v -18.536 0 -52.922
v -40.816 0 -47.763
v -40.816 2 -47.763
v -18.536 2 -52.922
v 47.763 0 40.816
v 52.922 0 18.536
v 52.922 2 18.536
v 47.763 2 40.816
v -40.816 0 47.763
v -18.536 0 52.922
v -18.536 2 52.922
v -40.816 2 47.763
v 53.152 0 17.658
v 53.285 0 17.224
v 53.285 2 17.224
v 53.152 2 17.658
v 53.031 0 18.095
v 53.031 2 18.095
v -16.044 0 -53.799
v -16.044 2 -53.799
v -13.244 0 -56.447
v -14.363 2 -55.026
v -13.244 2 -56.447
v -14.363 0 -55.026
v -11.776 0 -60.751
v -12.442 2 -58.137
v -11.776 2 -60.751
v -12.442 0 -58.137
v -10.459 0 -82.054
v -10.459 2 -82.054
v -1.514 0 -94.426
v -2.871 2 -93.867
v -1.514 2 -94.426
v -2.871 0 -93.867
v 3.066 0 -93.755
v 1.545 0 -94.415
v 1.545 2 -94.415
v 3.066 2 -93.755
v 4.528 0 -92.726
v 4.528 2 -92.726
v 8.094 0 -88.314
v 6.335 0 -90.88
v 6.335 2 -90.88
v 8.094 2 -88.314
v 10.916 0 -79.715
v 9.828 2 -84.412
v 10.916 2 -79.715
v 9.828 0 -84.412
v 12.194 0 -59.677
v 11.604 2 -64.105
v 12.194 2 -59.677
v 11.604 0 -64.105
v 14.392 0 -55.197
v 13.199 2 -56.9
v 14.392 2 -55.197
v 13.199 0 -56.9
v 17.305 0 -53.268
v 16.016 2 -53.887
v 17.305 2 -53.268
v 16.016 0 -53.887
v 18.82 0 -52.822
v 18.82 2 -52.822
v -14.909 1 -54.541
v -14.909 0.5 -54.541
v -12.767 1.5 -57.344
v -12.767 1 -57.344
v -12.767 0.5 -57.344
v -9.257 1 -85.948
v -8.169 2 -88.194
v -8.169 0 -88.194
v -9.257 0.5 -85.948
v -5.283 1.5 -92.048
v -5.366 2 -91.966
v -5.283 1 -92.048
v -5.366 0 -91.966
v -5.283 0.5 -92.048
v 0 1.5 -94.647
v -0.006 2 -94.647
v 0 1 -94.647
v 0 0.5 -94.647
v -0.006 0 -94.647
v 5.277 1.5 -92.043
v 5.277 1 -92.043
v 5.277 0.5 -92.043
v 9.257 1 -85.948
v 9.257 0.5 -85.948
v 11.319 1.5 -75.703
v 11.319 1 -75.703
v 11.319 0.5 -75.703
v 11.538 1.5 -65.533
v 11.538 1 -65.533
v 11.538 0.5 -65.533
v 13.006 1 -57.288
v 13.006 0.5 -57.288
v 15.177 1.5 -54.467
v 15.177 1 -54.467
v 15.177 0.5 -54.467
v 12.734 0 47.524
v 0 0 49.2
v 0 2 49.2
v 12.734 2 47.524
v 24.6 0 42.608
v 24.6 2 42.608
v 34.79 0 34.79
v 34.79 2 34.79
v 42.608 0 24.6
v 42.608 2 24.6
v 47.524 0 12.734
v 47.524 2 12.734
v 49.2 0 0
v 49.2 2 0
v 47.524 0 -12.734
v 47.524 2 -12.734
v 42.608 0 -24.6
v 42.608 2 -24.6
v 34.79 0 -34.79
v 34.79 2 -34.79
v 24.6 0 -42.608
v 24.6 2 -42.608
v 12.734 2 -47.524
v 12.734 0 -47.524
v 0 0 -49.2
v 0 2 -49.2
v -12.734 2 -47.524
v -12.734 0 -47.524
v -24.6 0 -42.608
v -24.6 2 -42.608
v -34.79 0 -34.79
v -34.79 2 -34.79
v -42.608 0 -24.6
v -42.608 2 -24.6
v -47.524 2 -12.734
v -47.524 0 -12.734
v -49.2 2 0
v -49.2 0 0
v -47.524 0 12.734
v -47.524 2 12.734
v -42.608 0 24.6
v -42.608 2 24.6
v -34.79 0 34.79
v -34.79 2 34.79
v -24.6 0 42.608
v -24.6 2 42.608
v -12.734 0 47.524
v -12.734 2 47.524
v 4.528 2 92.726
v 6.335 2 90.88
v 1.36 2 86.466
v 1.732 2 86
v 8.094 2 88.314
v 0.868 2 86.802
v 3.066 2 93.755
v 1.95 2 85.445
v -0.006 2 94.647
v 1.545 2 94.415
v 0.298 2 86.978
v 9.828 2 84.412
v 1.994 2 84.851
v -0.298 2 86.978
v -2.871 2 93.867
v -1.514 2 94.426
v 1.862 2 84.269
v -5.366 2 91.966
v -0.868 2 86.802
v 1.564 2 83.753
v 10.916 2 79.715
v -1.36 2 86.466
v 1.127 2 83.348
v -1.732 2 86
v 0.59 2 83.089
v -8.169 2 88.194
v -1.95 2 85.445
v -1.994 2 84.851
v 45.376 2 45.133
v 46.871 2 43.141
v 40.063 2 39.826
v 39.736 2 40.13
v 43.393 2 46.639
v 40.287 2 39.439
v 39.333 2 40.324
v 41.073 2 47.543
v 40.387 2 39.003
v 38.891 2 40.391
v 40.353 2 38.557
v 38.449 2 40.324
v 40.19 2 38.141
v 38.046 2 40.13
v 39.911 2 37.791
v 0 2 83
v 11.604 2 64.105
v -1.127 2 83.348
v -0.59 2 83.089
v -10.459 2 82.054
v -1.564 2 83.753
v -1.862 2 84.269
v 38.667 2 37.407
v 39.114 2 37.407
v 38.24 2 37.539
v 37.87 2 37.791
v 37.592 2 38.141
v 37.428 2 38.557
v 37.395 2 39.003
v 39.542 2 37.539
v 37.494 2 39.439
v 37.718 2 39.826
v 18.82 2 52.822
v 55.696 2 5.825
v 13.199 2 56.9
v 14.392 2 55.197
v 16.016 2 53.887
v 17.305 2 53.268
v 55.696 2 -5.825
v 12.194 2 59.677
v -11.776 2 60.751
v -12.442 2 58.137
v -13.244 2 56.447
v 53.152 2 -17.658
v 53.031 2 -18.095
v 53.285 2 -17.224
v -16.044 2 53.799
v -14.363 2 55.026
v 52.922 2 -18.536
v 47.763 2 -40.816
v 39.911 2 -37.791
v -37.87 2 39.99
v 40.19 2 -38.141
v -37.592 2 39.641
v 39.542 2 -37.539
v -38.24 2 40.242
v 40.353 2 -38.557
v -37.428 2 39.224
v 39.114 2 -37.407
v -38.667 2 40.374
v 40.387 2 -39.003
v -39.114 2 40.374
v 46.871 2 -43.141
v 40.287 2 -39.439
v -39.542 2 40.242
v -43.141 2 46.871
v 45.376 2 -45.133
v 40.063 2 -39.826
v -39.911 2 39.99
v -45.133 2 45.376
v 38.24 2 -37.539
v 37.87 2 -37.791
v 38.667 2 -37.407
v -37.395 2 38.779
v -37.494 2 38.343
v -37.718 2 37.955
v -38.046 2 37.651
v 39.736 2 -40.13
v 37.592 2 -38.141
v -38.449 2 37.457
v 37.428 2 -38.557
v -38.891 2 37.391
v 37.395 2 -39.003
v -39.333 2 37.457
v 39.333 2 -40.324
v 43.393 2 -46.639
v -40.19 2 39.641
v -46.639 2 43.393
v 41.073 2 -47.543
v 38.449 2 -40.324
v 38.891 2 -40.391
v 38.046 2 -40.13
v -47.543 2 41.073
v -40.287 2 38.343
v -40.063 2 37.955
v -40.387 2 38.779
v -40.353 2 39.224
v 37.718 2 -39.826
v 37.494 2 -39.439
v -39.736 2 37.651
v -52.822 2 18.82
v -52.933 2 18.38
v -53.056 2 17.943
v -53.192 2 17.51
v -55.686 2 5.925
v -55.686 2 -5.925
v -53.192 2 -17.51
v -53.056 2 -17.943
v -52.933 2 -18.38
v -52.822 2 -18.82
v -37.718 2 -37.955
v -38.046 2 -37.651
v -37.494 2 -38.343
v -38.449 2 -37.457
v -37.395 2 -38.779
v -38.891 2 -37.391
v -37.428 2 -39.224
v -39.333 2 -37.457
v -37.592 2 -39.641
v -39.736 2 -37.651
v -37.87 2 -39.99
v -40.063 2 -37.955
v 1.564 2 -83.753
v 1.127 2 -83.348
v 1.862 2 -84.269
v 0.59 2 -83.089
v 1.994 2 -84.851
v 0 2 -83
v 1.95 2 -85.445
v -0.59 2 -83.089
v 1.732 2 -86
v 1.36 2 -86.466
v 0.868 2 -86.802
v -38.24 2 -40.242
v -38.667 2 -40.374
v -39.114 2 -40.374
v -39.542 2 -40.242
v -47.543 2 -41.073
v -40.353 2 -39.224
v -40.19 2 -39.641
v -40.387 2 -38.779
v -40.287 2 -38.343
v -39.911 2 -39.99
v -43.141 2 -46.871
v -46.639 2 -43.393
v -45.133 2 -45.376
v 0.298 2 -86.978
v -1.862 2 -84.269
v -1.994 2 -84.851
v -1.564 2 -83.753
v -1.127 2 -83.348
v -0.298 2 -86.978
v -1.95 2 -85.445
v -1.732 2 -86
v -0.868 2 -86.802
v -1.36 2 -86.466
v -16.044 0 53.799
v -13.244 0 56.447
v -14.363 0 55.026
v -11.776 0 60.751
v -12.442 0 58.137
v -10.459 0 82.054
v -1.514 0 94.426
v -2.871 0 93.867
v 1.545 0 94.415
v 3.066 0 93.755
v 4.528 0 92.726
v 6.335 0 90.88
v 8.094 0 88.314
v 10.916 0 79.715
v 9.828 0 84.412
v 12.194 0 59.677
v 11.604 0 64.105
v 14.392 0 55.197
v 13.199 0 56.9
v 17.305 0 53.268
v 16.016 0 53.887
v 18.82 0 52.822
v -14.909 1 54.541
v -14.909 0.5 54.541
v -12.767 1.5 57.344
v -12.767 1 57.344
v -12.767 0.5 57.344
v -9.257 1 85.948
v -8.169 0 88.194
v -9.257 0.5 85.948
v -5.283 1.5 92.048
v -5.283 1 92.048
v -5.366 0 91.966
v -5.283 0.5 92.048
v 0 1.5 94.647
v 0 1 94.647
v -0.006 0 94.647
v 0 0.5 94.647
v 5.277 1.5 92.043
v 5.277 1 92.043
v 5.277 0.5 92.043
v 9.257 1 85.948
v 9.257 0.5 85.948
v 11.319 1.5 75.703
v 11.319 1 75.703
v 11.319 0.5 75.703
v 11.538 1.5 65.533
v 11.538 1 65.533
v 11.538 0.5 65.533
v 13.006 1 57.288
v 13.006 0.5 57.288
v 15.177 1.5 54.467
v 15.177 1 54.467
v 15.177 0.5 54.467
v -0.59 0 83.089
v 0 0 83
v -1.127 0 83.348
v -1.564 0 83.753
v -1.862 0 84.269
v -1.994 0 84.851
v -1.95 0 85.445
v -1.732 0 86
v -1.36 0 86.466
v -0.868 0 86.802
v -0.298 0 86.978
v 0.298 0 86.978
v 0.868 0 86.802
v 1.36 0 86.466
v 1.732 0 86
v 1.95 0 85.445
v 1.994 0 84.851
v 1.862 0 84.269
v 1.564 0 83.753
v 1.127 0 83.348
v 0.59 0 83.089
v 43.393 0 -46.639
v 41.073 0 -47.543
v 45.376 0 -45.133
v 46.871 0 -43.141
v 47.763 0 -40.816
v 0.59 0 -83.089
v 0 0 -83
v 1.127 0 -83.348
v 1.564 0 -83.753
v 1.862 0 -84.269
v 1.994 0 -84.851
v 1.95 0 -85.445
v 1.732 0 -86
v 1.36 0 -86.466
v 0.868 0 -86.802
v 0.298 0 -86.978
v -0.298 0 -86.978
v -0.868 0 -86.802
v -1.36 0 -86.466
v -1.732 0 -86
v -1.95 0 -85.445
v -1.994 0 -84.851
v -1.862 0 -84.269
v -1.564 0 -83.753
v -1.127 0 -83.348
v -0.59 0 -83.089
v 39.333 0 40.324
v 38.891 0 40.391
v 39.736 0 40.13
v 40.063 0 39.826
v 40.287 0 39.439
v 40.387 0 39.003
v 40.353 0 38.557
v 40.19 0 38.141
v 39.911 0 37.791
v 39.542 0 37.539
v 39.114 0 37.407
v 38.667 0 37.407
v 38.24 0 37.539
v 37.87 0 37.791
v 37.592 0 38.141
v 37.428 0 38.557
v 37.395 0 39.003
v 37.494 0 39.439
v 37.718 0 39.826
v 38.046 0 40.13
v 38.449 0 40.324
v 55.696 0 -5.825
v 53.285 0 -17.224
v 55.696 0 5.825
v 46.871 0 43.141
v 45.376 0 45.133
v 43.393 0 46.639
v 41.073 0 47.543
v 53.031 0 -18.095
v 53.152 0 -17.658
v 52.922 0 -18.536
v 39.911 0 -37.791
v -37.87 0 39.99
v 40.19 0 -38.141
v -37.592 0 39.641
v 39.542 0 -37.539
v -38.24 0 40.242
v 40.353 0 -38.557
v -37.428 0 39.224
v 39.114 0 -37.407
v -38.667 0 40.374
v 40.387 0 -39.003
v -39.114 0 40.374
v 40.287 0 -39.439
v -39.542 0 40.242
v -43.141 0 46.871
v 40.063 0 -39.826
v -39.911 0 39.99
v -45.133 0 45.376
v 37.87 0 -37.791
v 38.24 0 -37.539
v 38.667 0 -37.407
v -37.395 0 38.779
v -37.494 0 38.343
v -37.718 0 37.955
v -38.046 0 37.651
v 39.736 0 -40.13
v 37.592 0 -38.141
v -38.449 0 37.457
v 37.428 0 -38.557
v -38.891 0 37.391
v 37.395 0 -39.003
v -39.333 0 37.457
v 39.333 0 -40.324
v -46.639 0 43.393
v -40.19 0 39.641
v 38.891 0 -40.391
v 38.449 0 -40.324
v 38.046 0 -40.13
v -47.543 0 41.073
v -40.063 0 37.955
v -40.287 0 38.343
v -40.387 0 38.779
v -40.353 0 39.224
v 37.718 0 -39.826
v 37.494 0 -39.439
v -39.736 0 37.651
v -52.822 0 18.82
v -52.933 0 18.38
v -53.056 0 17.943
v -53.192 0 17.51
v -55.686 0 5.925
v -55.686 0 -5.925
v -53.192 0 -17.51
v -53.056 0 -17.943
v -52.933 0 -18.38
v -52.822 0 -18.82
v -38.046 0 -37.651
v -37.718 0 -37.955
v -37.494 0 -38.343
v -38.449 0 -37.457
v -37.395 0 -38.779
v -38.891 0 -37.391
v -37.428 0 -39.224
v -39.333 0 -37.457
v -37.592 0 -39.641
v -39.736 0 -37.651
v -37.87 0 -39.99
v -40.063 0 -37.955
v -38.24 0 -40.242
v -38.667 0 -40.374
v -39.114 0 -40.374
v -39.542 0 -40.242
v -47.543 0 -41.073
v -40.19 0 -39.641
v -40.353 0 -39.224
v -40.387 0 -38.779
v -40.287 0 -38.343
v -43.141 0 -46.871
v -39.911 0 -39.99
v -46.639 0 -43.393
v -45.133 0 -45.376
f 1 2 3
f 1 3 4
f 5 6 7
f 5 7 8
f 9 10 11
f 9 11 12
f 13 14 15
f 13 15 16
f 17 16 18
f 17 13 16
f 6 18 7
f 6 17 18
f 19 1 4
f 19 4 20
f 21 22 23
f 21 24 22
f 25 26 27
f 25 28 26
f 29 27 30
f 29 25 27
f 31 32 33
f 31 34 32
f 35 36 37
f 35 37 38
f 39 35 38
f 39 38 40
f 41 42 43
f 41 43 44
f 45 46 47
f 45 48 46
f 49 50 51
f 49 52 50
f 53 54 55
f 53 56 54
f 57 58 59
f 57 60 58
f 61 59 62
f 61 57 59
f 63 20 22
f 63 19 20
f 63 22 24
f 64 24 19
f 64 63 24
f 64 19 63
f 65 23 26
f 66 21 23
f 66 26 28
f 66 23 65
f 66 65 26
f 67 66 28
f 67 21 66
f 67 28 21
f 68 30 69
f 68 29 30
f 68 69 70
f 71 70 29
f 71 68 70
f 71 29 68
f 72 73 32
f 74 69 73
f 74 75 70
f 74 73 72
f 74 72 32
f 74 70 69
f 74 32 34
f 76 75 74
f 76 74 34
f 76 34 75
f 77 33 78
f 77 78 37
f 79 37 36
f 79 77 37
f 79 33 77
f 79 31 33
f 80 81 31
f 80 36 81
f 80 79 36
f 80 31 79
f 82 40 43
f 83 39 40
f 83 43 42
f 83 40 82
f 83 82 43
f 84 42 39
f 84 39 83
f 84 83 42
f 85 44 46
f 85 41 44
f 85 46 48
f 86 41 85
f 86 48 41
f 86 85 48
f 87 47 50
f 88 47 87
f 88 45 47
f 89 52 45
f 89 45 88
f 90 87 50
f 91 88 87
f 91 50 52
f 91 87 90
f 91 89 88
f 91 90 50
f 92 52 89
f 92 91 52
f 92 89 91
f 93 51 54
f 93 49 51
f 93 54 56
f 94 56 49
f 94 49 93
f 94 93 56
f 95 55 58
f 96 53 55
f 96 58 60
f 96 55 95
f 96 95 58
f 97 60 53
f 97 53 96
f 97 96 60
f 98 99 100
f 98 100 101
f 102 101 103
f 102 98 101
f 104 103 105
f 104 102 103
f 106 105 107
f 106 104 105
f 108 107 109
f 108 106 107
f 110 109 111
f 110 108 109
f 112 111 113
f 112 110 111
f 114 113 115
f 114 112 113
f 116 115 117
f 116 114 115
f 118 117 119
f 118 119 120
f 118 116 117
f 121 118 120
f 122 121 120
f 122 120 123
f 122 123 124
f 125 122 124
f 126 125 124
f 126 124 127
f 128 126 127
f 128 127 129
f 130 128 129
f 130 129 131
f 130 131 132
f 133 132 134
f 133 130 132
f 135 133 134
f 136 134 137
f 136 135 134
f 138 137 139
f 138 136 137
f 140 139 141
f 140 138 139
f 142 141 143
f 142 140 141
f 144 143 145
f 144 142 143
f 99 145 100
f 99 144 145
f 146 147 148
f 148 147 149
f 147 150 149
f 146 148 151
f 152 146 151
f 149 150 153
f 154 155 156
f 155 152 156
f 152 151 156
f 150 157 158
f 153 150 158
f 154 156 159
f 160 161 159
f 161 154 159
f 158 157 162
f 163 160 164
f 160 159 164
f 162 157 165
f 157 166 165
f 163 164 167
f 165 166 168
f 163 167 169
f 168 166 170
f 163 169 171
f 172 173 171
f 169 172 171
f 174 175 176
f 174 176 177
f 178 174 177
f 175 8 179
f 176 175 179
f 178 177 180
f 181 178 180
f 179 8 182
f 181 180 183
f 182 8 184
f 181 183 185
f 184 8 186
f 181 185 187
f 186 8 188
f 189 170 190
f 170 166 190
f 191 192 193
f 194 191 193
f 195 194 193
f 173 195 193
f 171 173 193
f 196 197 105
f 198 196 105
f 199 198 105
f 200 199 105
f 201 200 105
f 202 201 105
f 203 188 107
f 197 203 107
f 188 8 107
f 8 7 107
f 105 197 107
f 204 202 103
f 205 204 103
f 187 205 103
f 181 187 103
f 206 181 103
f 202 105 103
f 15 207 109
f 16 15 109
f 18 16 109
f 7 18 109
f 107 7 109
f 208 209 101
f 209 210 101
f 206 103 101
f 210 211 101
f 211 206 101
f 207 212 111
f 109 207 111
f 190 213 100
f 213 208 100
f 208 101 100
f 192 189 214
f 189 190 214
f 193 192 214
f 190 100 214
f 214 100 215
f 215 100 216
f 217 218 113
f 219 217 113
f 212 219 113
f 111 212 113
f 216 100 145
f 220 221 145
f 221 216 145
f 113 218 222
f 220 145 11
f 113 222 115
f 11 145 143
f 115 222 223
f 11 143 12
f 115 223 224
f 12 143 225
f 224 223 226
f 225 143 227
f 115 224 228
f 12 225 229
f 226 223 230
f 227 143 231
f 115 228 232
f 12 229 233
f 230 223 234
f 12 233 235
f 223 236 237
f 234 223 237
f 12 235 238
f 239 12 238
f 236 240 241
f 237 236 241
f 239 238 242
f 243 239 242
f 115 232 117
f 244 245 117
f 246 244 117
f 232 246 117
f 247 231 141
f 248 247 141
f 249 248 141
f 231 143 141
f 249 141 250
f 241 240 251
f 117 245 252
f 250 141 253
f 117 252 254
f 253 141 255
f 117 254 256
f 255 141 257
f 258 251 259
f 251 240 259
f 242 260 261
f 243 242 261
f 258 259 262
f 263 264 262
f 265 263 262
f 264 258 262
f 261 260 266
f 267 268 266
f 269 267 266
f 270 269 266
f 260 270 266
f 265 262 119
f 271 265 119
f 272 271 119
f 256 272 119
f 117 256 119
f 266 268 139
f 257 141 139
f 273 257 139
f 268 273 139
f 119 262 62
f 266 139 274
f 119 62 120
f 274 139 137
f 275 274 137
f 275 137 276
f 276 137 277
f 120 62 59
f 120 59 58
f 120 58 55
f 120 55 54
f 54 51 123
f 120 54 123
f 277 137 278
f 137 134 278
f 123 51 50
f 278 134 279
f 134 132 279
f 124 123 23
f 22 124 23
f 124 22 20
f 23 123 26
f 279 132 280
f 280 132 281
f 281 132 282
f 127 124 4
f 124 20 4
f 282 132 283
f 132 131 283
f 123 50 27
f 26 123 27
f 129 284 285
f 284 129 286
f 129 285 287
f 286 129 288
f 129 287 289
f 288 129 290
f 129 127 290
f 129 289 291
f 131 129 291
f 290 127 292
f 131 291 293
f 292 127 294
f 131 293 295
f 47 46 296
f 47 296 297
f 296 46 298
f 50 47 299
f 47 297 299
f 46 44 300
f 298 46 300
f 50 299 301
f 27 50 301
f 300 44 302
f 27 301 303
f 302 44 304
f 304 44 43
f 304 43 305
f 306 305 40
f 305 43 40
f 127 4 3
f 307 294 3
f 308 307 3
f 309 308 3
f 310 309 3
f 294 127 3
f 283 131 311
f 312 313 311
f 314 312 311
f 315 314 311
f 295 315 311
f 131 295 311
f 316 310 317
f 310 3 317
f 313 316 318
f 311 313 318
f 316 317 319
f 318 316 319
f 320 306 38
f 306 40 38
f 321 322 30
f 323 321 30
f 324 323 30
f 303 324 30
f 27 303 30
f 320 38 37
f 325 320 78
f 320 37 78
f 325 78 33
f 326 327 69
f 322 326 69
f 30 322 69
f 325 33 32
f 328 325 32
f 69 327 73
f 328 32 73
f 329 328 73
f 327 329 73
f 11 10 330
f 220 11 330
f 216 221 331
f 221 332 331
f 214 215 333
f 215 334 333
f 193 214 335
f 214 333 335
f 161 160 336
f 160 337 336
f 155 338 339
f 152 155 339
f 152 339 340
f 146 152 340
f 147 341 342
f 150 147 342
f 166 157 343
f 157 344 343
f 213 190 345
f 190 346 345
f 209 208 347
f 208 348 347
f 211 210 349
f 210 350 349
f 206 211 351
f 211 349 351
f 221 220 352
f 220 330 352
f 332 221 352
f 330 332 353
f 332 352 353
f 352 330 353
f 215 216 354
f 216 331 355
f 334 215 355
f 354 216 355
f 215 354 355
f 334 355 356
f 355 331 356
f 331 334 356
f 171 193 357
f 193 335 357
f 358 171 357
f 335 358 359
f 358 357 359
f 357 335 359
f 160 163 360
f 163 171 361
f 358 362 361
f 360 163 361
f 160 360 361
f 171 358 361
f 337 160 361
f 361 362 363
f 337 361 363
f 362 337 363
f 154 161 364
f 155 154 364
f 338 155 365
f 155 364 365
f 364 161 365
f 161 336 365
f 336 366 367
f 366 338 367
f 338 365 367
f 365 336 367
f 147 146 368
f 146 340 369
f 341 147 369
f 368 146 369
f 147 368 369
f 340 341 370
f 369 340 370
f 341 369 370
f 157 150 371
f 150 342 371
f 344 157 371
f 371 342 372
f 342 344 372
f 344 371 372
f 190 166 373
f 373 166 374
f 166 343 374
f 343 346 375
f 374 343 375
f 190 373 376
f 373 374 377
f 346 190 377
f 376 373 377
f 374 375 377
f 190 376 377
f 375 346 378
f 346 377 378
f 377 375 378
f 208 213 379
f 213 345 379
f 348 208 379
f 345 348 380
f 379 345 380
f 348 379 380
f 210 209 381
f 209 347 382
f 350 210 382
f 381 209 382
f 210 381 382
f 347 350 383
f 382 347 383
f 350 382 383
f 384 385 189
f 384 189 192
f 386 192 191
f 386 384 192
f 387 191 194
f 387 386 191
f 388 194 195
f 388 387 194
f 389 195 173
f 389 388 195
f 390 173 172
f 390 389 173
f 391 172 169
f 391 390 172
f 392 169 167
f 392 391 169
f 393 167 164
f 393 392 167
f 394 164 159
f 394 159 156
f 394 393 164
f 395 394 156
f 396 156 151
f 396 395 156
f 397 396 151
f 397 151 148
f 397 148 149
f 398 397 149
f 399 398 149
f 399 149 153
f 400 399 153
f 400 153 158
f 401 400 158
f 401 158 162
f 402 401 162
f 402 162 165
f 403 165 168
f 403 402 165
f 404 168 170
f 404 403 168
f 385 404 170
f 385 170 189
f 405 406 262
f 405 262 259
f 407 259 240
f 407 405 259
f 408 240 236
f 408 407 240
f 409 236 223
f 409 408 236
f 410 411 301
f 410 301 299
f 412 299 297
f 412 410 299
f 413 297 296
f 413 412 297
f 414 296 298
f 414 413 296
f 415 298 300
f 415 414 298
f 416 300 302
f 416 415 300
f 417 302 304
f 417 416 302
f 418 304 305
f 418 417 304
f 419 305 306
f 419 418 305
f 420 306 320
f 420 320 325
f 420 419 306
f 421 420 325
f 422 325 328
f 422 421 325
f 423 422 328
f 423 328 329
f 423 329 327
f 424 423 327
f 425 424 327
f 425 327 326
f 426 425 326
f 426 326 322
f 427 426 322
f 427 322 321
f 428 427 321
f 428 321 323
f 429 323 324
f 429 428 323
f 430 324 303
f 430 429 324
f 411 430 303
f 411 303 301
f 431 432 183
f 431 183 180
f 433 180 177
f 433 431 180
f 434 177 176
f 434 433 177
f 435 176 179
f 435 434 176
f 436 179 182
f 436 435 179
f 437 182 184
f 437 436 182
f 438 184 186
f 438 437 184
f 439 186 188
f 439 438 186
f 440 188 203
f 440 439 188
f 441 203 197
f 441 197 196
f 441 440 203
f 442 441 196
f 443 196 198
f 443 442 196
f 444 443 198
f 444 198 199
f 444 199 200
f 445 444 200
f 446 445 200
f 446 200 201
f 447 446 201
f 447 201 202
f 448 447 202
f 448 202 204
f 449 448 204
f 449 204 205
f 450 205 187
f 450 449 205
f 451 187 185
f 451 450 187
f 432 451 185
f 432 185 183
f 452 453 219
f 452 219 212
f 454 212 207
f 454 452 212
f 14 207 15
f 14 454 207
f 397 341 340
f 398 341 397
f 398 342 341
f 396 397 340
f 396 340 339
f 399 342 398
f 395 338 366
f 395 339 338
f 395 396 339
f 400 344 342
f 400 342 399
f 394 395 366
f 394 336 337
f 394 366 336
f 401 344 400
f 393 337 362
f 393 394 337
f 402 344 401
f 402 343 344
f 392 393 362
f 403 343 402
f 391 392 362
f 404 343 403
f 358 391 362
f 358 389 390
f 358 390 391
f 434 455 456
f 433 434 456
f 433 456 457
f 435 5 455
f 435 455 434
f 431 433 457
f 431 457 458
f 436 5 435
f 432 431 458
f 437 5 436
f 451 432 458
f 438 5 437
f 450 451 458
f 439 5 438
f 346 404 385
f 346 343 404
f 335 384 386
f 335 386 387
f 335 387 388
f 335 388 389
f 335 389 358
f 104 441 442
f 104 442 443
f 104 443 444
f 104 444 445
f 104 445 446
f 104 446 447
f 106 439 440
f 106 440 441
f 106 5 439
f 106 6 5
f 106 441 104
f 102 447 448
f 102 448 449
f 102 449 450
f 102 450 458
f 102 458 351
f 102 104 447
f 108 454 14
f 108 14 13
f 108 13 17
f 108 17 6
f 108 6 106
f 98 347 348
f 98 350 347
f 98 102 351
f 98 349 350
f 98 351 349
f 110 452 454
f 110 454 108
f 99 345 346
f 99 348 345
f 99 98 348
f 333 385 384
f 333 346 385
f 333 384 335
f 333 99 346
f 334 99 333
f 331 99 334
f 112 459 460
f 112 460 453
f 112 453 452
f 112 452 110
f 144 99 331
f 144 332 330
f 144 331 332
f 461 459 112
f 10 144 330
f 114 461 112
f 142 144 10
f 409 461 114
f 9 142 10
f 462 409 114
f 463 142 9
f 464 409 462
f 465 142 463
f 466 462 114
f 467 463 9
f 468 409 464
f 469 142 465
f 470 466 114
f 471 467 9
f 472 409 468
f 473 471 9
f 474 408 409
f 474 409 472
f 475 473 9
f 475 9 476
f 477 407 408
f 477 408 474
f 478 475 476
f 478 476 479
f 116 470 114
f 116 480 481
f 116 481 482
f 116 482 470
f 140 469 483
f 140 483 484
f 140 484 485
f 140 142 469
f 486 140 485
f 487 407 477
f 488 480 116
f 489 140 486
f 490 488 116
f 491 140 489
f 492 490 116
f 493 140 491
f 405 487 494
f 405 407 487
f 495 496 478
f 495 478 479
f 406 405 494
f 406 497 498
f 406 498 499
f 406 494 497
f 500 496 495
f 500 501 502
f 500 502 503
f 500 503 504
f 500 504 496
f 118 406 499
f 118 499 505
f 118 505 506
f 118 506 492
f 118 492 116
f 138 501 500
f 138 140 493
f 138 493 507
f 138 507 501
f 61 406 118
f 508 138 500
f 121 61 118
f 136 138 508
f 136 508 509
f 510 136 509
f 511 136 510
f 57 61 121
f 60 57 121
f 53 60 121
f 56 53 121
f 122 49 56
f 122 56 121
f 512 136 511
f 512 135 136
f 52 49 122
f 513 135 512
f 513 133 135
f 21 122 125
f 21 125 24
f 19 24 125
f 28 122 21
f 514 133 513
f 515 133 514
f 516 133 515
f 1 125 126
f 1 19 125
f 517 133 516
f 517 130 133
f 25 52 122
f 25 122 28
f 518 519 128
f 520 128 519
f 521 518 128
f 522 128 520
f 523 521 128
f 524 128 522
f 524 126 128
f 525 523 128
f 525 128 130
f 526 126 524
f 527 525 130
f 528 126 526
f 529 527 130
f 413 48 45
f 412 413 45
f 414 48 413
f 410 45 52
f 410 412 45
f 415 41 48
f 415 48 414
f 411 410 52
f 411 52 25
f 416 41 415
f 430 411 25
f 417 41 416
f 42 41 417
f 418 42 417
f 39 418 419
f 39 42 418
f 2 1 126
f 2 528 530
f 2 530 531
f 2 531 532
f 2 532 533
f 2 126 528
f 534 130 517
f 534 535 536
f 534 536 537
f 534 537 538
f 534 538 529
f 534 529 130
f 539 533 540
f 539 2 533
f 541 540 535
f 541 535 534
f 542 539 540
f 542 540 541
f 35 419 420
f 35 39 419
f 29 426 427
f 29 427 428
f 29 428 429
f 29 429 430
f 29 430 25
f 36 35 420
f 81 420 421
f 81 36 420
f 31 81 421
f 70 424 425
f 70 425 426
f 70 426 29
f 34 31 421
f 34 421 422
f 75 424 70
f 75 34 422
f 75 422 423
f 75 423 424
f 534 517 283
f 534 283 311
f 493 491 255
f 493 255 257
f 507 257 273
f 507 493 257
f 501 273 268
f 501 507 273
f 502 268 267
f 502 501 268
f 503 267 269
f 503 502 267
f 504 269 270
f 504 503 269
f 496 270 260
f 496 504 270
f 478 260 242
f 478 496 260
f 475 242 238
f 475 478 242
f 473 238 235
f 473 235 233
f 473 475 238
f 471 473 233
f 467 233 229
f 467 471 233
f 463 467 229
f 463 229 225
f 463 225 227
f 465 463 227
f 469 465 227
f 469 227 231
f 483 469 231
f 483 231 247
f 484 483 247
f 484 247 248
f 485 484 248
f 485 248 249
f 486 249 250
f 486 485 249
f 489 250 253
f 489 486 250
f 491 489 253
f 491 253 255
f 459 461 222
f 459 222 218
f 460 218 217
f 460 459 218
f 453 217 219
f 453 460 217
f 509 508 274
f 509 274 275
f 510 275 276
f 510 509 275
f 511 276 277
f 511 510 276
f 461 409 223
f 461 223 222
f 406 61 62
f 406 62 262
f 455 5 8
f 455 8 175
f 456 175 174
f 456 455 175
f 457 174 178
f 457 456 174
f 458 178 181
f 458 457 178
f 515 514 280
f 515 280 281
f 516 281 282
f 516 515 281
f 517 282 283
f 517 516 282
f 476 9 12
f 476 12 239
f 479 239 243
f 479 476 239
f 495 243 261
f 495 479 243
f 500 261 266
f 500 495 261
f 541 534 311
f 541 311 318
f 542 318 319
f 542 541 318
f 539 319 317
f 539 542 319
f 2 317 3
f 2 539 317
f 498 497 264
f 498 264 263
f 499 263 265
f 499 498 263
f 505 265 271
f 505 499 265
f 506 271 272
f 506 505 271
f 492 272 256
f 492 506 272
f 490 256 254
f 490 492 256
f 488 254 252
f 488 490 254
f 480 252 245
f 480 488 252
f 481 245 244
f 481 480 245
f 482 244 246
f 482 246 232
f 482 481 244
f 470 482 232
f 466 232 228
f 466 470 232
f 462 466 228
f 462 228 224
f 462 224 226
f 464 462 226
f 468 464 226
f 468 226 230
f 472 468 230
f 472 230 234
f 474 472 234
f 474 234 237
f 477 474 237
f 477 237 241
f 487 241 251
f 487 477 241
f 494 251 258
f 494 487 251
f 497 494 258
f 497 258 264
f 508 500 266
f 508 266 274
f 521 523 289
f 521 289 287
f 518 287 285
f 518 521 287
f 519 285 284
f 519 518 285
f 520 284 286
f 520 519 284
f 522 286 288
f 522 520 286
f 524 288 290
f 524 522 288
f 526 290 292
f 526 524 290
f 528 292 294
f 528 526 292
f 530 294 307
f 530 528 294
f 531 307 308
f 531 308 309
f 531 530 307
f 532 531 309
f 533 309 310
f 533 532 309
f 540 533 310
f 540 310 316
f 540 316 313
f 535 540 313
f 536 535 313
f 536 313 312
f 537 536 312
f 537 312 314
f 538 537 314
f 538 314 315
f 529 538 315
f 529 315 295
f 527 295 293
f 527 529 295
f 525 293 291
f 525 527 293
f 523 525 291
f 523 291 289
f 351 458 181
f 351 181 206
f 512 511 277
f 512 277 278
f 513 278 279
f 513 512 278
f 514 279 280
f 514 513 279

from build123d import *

# Parameters (mm, degrees)
SKETCH1_R           = 1.5
SKETCH1_R_2         = 49.2
SKETCH1_R_3         = 2
BOSS_EXTRUDE1_DEPTH = 2


with BuildPart() as part:
    # Sketch1 → Boss-Extrude1 (new body)
    with BuildSketch(Plane(origin=(0, 0, 0), x_dir=(1, 0, 0), z_dir=(0, 1, 0))):
        with BuildLine():
            Line((-40.816401641, 47.763274249), (-18.536148639, 52.922119493))
            add(Edge.make_bspline(
                [(-18.536148639, 52.922119493), (-6.536634723, 55.455425009), (-17.450586635, 79.503274209), (0.00798679, 98.683842699), (17.436525911, 79.432784357), (6.796227586, 55.436120512), (18.82031265, 52.821731984)],
                knots=[0, 0, 0, 0, 0.366190046, 0.499165373, 0.6321407, 1, 1, 1, 1], degree=3))
            Line((18.82031265, 52.821731984), (41.072517471, 47.543215273))
            ThreePointArc((41.072517471, 47.543215273), (45.376282852, 45.133058333), (47.763274249, 40.816401641))
            Line((47.763274249, 40.816401641), (52.922119493, 18.536148639))
            ThreePointArc((52.922119493, 18.536148639), (53.089772901, 17.876292735), (53.285345919, 17.224166462))
            ThreePointArc((53.285345919, 17.224166462), (56, 0), (53.285345919, -17.224166462))
            ThreePointArc((53.285345919, -17.224166462), (53.089772901, -17.876292735), (52.922119493, -18.536148639))
            Line((52.922119493, -18.536148639), (47.763274249, -40.816401641))
            ThreePointArc((47.763274249, -40.816401641), (45.376282852, -45.133058333), (41.072517471, -47.543215273))
            Line((41.072517471, -47.543215273), (18.82031265, -52.821731984))
            add(Edge.make_bspline(
                [(-18.536148639, -52.922119493), (-6.536634723, -55.455425009), (-17.450586635, -79.503274209), (0.00798679, -98.683842699), (17.436525911, -79.432784357), (6.796227586, -55.436120512), (18.82031265, -52.821731984)],
                knots=[0, 0, 0, 0, 0.366190046, 0.499165373, 0.6321407, 1, 1, 1, 1], degree=3))
            Line((-18.536148639, -52.922119493), (-40.816401641, -47.763274249))
            ThreePointArc((-40.816401641, -47.763274249), (-45.133058333, -45.376282852), (-47.543215273, -41.072517471))
            Line((-47.543215273, -41.072517471), (-52.821731984, -18.82031265))
            ThreePointArc((-52.821731984, -18.82031265), (-52.992929389, -18.161367335), (-53.192004456, -17.510301595))
            ThreePointArc((-53.192004456, -17.510301595), (-56, 0), (-53.192004456, 17.510301595))
            ThreePointArc((-53.192004456, 17.510301595), (-52.992929389, 18.161367335), (-52.821731984, 18.82031265))
            Line((-52.821731984, 18.82031265), (-47.543215273, 41.072517471))
            ThreePointArc((-47.543215273, 41.072517471), (-45.133058333, 45.376282852), (-40.816401641, 47.763274249))
        make_face()
        with Locations(Location((-38.8907, 38.8907, 0), (0, 0, 270))):
            Circle(SKETCH1_R, mode=Mode.SUBTRACT)
        with Locations(Location((38.8907, 38.8907, 0), (0, 0, 90))):
            Circle(SKETCH1_R, mode=Mode.SUBTRACT)
        with Locations(Location((38.8907, -38.8907, 0), (0, 0, 270))):
            Circle(SKETCH1_R, mode=Mode.SUBTRACT)
        with Locations(Location((-38.8907, -38.8907, 0), (0, 0, 90))):
            Circle(SKETCH1_R, mode=Mode.SUBTRACT)
        with Locations(Location((0, 0, 0), (0, 0, 270))):
            Circle(SKETCH1_R_2, mode=Mode.SUBTRACT)
        with Locations(Location((0, 85, 0), (0, 0, 270))):
            Circle(SKETCH1_R_3, mode=Mode.SUBTRACT)
        with Locations(Location((0, -85, 0), (0, 0, 90))):
            Circle(SKETCH1_R_3, mode=Mode.SUBTRACT)
    extrude(amount=BOSS_EXTRUDE1_DEPTH)


solid = part.part
